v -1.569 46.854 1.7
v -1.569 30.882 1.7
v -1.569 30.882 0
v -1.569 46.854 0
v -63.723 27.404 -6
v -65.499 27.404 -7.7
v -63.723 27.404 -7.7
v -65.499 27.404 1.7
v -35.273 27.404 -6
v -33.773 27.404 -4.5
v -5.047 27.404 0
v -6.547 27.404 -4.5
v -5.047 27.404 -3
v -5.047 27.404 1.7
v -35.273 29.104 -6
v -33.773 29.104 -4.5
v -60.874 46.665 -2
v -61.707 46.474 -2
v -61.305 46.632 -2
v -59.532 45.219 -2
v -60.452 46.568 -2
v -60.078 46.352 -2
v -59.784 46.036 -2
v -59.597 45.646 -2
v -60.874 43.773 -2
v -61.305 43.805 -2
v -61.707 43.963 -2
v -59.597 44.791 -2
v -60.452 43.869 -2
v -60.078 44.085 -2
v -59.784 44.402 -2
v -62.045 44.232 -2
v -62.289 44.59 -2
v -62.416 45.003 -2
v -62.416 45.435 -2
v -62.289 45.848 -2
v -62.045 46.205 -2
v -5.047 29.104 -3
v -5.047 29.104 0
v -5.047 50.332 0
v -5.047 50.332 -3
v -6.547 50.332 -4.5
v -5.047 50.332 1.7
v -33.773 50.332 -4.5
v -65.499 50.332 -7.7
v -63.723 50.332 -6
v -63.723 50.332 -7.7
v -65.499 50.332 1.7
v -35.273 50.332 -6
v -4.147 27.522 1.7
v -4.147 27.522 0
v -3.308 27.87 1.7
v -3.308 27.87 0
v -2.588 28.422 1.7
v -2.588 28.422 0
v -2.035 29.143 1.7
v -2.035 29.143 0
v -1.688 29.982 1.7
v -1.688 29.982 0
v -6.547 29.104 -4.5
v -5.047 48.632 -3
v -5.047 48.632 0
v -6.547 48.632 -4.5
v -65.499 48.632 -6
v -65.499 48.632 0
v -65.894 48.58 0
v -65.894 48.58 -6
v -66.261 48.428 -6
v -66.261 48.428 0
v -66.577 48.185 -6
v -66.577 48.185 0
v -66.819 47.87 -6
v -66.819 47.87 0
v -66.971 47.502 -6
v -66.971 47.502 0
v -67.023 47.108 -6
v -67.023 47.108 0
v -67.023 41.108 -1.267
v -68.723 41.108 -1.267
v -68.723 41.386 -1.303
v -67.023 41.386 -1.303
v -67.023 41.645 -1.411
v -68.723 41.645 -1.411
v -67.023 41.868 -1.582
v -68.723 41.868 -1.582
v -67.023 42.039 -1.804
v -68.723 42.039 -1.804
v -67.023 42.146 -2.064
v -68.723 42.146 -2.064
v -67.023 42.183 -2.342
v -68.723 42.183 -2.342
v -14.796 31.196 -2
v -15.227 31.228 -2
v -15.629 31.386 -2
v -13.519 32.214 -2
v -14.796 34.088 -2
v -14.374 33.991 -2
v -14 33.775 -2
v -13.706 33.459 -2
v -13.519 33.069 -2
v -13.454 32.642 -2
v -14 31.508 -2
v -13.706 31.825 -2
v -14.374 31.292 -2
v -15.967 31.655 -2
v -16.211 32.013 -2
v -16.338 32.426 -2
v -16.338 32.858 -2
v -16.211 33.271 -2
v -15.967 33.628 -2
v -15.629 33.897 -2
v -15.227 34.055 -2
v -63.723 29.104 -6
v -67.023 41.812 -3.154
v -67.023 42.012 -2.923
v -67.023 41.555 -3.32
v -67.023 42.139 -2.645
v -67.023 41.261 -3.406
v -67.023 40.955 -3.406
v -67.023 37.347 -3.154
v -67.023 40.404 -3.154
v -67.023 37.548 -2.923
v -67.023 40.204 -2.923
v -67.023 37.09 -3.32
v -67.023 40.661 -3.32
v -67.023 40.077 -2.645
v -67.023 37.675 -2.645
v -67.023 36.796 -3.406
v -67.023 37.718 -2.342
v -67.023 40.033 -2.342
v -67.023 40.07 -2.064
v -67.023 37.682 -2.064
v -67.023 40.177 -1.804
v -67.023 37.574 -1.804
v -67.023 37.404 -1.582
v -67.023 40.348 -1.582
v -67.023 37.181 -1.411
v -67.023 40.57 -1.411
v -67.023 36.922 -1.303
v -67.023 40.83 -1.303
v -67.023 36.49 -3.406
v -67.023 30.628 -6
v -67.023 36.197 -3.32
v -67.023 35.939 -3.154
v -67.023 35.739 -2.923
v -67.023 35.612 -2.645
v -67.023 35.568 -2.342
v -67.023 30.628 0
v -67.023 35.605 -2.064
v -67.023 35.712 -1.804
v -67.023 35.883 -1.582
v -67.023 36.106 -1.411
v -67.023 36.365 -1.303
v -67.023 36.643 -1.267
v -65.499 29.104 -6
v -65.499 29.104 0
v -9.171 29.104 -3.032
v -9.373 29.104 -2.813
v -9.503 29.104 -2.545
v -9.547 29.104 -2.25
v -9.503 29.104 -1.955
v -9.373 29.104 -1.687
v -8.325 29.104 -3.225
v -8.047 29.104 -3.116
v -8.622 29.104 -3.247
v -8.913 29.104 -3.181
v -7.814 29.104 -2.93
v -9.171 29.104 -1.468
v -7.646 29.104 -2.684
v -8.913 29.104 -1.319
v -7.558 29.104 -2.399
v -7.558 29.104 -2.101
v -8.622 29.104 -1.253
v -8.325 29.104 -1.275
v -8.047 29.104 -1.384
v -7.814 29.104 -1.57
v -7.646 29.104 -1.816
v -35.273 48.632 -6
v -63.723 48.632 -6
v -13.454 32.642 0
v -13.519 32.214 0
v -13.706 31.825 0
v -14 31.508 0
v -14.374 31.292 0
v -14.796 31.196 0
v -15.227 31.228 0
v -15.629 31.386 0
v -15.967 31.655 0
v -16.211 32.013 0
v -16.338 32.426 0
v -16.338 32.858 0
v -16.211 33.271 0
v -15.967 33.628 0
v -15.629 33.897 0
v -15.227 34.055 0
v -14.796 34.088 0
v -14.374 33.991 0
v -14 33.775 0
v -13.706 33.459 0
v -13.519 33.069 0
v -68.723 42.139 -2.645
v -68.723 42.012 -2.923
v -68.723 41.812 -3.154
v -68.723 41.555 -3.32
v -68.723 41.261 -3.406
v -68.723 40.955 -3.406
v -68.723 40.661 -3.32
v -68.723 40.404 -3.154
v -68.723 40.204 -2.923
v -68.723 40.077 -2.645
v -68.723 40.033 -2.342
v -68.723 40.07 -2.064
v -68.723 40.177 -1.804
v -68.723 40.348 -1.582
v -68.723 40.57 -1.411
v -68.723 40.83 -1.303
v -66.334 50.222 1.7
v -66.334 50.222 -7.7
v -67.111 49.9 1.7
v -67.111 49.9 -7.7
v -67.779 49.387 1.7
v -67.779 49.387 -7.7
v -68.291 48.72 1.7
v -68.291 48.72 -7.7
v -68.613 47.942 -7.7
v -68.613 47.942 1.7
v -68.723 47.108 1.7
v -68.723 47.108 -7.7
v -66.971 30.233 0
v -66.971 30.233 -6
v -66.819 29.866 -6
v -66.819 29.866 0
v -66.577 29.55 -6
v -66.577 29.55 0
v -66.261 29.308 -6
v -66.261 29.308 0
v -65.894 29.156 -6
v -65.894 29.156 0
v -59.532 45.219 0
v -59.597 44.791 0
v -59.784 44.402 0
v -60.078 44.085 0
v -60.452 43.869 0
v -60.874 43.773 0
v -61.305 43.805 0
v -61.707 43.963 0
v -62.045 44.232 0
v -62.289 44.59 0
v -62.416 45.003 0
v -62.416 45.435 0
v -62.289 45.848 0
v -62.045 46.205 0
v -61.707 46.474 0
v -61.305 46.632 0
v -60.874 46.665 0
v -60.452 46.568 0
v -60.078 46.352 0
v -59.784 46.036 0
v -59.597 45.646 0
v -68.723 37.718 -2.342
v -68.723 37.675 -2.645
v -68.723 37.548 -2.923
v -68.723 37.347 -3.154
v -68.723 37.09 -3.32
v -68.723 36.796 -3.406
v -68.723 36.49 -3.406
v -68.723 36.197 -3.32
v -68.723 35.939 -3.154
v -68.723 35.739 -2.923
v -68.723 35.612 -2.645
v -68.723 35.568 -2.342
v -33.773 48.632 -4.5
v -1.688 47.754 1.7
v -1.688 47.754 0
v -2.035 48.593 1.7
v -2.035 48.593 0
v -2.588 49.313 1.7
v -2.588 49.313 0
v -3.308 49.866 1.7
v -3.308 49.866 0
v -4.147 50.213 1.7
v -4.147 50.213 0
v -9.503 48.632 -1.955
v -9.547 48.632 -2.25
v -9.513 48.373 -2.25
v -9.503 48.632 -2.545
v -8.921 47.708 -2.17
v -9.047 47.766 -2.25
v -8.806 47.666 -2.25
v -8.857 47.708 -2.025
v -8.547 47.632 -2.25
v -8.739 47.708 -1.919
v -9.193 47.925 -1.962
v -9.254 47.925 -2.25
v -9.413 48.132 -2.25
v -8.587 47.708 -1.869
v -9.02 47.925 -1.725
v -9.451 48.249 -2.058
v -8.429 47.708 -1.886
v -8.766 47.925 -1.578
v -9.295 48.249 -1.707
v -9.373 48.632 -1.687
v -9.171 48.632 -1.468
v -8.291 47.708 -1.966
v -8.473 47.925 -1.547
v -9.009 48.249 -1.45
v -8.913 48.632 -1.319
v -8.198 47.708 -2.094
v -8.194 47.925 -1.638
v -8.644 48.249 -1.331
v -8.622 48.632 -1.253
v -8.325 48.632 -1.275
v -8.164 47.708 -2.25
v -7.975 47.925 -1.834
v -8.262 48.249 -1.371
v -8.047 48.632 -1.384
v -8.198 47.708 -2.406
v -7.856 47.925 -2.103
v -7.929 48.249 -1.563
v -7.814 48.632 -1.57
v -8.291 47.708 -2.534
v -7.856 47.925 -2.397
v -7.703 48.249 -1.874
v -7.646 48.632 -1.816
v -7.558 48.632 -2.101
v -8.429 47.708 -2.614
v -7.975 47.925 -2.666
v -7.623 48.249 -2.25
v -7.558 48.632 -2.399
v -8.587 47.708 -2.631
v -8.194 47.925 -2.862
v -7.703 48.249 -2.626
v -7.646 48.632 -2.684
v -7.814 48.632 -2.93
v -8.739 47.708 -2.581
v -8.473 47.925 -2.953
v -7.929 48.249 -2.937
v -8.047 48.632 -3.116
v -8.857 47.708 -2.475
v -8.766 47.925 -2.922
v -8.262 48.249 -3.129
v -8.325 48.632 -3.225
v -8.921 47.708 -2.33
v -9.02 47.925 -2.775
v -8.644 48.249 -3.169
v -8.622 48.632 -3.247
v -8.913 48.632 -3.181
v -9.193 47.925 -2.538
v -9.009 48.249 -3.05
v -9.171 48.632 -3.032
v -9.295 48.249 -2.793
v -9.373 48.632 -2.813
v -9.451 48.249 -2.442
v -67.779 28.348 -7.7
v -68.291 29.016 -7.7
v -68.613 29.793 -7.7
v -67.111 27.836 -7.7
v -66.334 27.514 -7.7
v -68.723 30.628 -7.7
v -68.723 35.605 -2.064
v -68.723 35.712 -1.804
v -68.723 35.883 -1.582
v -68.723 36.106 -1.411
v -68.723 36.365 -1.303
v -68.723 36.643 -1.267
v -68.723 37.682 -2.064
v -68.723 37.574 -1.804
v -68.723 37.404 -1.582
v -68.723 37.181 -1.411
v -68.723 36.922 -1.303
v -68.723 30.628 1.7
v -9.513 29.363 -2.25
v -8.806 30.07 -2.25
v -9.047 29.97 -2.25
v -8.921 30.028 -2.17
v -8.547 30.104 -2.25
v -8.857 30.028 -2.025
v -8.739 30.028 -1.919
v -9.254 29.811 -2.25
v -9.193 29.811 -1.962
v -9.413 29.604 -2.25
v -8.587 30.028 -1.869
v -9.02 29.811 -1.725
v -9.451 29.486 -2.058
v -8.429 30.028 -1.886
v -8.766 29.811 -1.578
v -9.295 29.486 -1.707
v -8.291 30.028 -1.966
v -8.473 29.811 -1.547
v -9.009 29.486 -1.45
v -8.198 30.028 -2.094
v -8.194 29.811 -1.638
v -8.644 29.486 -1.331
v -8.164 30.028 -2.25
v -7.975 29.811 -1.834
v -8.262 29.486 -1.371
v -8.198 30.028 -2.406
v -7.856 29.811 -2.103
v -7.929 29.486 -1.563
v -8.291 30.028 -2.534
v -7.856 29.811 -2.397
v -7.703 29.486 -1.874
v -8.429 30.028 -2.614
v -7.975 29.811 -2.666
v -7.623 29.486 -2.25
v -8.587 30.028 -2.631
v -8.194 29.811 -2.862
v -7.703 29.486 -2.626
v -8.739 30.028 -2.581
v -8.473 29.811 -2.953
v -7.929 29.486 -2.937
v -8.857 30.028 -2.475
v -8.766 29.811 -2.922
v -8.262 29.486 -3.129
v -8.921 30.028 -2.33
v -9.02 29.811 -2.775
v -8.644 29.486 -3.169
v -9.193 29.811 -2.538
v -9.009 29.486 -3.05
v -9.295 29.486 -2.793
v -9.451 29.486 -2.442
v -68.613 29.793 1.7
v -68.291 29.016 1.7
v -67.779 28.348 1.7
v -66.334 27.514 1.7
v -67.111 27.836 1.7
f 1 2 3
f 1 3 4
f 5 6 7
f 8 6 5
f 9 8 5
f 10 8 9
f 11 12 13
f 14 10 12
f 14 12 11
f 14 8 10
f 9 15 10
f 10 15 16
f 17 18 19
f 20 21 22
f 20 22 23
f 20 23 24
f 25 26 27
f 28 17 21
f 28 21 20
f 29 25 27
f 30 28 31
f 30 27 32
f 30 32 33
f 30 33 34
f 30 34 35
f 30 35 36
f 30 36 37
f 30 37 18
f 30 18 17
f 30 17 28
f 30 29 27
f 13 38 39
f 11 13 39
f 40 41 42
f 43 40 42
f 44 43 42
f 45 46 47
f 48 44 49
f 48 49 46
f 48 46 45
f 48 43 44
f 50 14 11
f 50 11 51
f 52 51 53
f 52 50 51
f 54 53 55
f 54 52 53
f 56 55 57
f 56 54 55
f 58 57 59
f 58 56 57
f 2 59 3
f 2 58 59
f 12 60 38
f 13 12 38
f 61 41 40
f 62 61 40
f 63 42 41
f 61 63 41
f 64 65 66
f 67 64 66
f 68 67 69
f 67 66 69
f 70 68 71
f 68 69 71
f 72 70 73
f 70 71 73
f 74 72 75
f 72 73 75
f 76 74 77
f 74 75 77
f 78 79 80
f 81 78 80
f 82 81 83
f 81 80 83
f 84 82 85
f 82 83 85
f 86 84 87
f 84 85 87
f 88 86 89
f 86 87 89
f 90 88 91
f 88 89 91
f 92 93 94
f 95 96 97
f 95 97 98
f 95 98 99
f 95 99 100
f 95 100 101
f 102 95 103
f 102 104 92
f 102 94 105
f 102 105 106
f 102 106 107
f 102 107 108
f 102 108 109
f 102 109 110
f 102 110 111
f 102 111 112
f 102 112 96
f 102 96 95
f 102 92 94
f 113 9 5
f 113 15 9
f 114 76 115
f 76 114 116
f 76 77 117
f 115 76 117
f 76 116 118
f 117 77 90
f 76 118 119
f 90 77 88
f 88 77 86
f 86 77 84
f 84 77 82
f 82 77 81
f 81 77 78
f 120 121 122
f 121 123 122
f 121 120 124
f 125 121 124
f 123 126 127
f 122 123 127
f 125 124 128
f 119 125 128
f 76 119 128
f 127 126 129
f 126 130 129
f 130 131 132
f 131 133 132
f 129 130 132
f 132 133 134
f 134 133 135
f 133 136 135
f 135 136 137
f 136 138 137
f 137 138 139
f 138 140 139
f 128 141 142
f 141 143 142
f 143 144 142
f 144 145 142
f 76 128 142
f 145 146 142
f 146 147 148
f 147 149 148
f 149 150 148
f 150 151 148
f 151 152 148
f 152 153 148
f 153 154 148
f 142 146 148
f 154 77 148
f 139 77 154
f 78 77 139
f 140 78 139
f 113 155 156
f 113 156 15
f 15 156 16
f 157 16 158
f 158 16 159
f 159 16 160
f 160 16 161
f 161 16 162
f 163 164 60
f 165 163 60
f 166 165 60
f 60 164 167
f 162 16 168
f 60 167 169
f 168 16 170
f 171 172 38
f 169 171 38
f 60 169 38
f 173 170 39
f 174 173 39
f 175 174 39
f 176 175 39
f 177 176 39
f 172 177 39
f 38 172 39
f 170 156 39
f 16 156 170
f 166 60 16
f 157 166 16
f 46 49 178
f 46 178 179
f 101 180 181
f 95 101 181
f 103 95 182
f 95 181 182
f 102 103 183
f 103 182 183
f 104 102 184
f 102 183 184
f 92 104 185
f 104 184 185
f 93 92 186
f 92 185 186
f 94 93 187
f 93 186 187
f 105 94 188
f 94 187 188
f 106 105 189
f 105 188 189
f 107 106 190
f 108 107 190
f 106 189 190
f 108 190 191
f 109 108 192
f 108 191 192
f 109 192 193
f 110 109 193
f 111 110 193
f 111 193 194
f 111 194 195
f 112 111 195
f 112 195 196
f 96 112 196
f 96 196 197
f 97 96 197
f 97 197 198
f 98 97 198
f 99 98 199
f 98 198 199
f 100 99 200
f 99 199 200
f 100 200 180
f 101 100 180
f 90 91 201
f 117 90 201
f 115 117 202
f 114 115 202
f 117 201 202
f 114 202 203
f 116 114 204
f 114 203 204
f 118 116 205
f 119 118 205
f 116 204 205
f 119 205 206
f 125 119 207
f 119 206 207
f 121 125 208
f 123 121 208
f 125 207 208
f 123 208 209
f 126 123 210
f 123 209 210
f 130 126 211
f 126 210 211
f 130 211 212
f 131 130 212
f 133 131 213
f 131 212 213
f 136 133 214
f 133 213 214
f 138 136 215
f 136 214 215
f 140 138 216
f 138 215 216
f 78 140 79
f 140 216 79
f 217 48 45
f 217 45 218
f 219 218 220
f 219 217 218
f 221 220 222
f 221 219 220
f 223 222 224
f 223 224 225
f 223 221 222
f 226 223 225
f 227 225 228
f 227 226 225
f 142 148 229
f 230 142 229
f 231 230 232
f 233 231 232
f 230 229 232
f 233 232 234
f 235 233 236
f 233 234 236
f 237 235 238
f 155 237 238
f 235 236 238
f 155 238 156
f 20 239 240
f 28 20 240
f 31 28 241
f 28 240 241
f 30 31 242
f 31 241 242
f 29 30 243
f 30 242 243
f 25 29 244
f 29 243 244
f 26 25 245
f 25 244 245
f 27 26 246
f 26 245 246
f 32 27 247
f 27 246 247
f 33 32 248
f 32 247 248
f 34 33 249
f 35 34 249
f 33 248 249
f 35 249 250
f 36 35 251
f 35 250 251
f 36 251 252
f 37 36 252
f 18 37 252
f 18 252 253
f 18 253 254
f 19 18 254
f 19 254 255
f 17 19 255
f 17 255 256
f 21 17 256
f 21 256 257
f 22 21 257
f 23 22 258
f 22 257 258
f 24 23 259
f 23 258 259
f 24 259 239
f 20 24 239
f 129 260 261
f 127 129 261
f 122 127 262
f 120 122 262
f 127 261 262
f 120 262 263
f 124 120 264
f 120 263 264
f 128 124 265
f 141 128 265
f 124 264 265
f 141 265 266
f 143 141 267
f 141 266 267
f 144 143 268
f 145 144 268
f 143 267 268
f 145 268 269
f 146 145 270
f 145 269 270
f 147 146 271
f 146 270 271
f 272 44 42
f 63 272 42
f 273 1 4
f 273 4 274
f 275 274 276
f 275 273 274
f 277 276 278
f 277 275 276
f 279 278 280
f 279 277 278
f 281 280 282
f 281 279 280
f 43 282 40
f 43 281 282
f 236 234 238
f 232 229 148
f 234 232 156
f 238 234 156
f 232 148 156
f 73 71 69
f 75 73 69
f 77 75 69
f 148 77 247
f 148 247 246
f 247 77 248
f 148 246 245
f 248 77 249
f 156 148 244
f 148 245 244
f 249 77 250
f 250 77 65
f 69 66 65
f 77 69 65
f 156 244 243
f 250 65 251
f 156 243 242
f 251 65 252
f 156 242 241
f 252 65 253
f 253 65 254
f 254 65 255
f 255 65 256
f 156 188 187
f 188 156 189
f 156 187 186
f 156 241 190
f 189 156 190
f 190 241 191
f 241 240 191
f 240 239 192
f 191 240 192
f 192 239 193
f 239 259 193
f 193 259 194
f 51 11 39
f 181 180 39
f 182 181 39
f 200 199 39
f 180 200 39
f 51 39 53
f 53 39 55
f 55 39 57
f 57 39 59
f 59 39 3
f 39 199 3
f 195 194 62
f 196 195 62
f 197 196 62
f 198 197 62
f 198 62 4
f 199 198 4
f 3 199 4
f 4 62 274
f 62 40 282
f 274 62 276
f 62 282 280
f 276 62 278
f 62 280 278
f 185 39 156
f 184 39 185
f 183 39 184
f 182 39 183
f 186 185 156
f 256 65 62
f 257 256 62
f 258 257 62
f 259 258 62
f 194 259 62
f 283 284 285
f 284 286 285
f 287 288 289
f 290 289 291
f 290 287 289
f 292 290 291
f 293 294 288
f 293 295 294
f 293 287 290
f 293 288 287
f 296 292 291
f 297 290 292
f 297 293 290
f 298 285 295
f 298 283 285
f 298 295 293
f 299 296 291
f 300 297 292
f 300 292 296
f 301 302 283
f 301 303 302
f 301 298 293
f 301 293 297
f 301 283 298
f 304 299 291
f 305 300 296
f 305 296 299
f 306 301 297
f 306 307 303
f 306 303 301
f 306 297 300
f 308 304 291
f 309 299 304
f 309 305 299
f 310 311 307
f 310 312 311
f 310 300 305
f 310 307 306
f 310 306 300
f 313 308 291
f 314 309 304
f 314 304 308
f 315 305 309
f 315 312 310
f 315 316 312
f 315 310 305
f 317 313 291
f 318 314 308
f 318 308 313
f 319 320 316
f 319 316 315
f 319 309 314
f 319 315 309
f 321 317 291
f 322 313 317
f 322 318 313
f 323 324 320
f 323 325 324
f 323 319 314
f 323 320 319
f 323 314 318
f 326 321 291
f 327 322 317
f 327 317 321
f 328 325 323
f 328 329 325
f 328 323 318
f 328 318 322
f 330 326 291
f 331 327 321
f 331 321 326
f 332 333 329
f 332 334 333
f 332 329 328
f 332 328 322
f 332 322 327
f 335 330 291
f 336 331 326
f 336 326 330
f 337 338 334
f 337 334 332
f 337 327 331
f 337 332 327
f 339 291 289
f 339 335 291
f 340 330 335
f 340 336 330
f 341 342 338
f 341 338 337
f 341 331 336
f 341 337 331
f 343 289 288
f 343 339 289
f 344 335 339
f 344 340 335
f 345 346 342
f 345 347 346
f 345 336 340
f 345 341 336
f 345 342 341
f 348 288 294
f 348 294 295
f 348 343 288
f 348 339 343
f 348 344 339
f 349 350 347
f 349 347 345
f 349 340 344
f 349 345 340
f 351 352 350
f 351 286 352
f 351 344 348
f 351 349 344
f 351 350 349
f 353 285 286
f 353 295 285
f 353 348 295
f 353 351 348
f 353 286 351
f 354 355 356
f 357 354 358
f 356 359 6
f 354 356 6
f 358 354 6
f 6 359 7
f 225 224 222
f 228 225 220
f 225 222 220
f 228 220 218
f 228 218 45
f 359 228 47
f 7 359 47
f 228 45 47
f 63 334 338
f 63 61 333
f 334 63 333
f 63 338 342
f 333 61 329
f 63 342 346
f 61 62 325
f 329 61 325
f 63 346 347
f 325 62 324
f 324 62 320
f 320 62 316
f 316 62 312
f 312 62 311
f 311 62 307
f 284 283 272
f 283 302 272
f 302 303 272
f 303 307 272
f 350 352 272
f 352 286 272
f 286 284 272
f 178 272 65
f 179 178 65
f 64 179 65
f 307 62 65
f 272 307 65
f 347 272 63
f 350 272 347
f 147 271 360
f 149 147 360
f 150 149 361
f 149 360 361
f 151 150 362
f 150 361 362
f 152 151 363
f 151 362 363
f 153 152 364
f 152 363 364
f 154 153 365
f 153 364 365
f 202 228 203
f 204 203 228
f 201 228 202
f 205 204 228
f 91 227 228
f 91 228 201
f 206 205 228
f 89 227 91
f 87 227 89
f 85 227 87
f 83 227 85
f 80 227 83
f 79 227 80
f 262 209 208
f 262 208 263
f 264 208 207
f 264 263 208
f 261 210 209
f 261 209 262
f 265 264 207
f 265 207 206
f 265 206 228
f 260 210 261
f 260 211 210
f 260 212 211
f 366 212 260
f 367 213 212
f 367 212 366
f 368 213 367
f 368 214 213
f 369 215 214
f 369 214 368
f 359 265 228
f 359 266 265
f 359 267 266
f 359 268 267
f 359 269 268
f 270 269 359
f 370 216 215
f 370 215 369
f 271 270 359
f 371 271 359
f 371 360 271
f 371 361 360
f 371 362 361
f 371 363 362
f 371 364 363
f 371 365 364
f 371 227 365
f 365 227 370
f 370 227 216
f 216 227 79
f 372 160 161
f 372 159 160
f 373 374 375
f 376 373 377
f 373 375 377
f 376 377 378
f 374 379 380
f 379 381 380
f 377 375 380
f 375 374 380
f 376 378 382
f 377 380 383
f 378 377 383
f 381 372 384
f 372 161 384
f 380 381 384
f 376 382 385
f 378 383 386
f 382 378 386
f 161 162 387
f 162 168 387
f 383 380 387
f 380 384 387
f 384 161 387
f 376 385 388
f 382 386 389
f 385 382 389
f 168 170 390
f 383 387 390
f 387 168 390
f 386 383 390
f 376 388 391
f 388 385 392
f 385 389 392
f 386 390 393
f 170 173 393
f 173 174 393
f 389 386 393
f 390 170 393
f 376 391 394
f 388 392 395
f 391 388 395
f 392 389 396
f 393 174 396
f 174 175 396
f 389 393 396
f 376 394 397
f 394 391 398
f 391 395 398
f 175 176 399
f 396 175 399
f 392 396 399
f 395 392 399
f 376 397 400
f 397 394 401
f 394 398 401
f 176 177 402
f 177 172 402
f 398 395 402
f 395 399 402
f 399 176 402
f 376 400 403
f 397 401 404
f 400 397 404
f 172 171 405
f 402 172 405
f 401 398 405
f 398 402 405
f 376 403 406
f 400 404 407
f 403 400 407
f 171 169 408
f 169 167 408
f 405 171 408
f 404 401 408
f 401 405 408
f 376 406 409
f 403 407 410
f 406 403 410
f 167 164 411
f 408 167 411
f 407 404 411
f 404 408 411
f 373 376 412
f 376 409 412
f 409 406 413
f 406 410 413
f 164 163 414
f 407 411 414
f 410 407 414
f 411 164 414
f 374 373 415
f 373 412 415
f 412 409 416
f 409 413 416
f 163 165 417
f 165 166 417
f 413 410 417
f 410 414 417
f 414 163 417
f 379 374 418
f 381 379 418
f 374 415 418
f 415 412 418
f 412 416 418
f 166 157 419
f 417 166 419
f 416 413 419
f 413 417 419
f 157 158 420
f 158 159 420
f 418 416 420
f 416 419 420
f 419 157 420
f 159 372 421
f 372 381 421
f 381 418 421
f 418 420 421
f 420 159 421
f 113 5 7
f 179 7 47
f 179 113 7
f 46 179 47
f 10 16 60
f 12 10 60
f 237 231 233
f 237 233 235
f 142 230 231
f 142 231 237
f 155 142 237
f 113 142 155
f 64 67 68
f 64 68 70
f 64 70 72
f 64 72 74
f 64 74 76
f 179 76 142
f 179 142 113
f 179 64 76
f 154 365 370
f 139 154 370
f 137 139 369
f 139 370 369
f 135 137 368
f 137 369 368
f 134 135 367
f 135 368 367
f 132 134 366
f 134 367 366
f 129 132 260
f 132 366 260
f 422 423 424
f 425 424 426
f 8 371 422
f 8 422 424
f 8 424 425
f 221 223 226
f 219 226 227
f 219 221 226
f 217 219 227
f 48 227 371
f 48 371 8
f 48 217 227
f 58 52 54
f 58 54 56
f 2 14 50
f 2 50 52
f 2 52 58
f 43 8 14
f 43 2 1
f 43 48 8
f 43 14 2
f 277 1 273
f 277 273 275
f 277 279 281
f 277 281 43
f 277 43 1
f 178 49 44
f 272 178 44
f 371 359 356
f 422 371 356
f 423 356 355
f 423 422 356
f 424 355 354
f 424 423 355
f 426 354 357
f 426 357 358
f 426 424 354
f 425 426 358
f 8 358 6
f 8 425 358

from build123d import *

# Parameters (mm, degrees)
BOSS_EXTRUDE1_DEPTH = 6
BOSS_EXTRUDE2_START = 1.7
BOSS_EXTRUDE2_DEPTH = 1.7
CUT_EXTRUDE3_DEPTH  = 29
BOSS_EXTRUDE5_DEPTH = 1.7
CUT_EXTRUDE4_DEPTH  = 85.274737764
SKETCH17_R          = 1.45
BOSS_EXTRUDE6_DEPTH = 2


with BuildPart() as part:
    # Sketch1 → Boss-Extrude1 (new body)
    with BuildSketch(Plane.XY):
        with BuildLine():
            Line((-65.499084074, 50.331718091), (-14.793168506, 50.331718091))
            Line((-14.793168506, 50.331718091), (-5.047168405, 50.331718091))
            ThreePointArc((-5.047168405, 50.331718091), (-2.58785102, 49.313035476), (-1.569168405, 46.853718091))
            Line((-1.569168405, 46.853718091), (-1.569168405, 43.965718386))
            Line((-1.569168405, 43.965718386), (-1.569168405, 33.805718061))
            Line((-1.569168405, 33.805718061), (-1.569168405, 30.881718108))
            ThreePointArc((-1.569168405, 30.881718108), (-2.58785102, 28.422400723), (-5.047168405, 27.403718108))
            Line((-5.047168405, 27.403718108), (-14.829168757, 27.403718108))
            Line((-14.829168757, 27.403718108), (-65.499083667, 27.403718108))
            ThreePointArc((-65.499083667, 27.403718108), (-67.778855129, 28.348030366), (-68.723167387, 30.627801828))
            Line((-68.723167387, 30.627801828), (-68.723167387, 47.107634778))
            ThreePointArc((-68.723167387, 47.107634778), (-67.778855248, 49.387405952), (-65.499084074, 50.331718091))
        make_face()
        with BuildLine():
            Line((-3.269168405, 43.965718386), (-3.269168405, 46.853718091))
            ThreePointArc((-3.269168405, 46.853718091), (-3.789932548, 48.110953948), (-5.047168405, 48.631718091))
            Line((-5.047168405, 48.631718091), (-14.793168506, 48.631718091))
            Line((-14.793168506, 48.631718091), (-65.499084074, 48.631718091))
            ThreePointArc((-65.499084074, 48.631718091), (-66.57677372, 48.185324424), (-67.023167387, 47.107634778))
            Line((-67.023167387, 47.107634778), (-67.023167387, 30.627801828))
            ThreePointArc((-67.023167387, 30.627801828), (-66.576773601, 29.550111894), (-65.499083667, 29.103718108))
            Line((-65.499083667, 29.103718108), (-14.829168757, 29.103718108))
            Line((-14.829168757, 29.103718108), (-5.047168405, 29.103718108))
            ThreePointArc((-5.047168405, 29.103718108), (-3.789932548, 29.624482251), (-3.269168405, 30.881718108))
            Line((-3.269168405, 30.881718108), (-3.269168405, 33.805718061))
            Line((-3.269168405, 33.805718061), (-3.269168405, 43.965718386))
        make_face(mode=Mode.SUBTRACT)
    extrude(amount=-BOSS_EXTRUDE1_DEPTH)

    # Sketch3 → Boss-Extrude2 (add)
    with BuildSketch(Plane.XY.offset(BOSS_EXTRUDE2_START)):
        with BuildLine():
            Line((-68.723167387, 47.107634778), (-68.723167387, 30.627801828))
            ThreePointArc((-68.723167387, 30.627801828), (-67.778855129, 28.348030366), (-65.499083667, 27.403718108))
            Line((-65.499083667, 27.403718108), (-5.047168405, 27.403718108))
            ThreePointArc((-5.047168405, 27.403718108), (-2.58785102, 28.422400723), (-1.569168405, 30.881718108))
            Line((-1.569168405, 30.881718108), (-1.569168405, 46.853718091))
            ThreePointArc((-1.569168405, 46.853718091), (-2.58785102, 49.313035476), (-5.047168405, 50.331718091))
            Line((-5.047168405, 50.331718091), (-65.499084074, 50.331718091))
            ThreePointArc((-65.499084074, 50.331718091), (-67.778855248, 49.387405952), (-68.723167387, 47.107634778))
        make_face()
    extrude(amount=-BOSS_EXTRUDE2_DEPTH)

    # Sketch11 → Cut-Extrude3 (cut)
    with BuildSketch(Plane(origin=(0, 50.331718091, 0), x_dir=(1, 0, 0), z_dir=(0, 1, 0))):
        Polygon((-35.27312624, 6), (-33.77312624, 4.5), (-6.547168405, 4.5), (-5.047168405, 3), (-5.047168405, 0), (-1.569168405, 0), (-1.569168405, 6), align=None)
    extrude(amount=-CUT_EXTRUDE3_DEPTH, mode=Mode.SUBTRACT)

    # Sketch13 → Revolve3 (revolve)
    with BuildSketch(Plane(origin=(0, 0, -2.25), x_dir=(-1, 0, 0), z_dir=(0, 0, -1))):
        with BuildLine():
            Line((8.547168405, 29.103718108), (8.547168405, 30.103718108))
            ThreePointArc((8.547168405, 30.103718108), (9.254275186, 29.810824889), (9.547168405, 29.103718108))
            Line((9.547168405, 29.103718108), (8.547168405, 29.103718108))
        make_face()
    revolve3 = revolve(axis=Axis((-8.547168405, 29.103718108, -2.25), (0, 1, 0)))

    # Mirror3: Revolve3 across plane
    add(revolve3.mirror(Plane(origin=(0, 38.867718099, 0), x_dir=(0, 0, 1), z_dir=(0, -1, 0))))

    # Sketch14 → Boss-Extrude5 (add)
    with BuildSketch(Plane(origin=(0, 0, -6), x_dir=(-1, 0, 0), z_dir=(0, 0, -1))):
        with BuildLine():
            Line((63.723167387, 27.403718108), (63.723167387, 50.331718091))
            Line((63.723167387, 50.331718091), (65.499084074, 50.331718091))
            ThreePointArc((65.499084074, 50.331718091), (67.778855248, 49.387405952), (68.723167387, 47.107634778))
            Line((68.723167387, 47.107634778), (68.723167387, 30.627801828))
            ThreePointArc((68.723167387, 30.627801828), (67.778855129, 28.348030366), (65.499083667, 27.403718108))
            Line((65.499083667, 27.403718108), (63.723167387, 27.403718108))
        make_face()
    extrude(amount=BOSS_EXTRUDE5_DEPTH)

    # Sketch15 → Cut-Extrude4 (cut, through all)
    with BuildSketch(Plane.ZY.offset(68.723167387)):
        with BuildLine():
            ThreePointArc((-2.341753072, 42.182977625), (-3.416753072, 41.107977625), (-2.341753072, 40.032977625))
            Line((-2.341753072, 40.032977625), (-2.341753072, 42.182977625))
        make_face()
        with BuildLine():
            Line((-2.341753072, 42.182977625), (-2.341753072, 40.032977625))
            ThreePointArc((-2.341753072, 40.032977625), (-1.581613282, 40.347837835), (-1.266753072, 41.107977625))
            ThreePointArc((-1.266753072, 41.107977625), (-1.581613282, 41.868117415), (-2.341753072, 42.182977625))
        make_face()
        with BuildLine():
            ThreePointArc((-2.341753072, 37.718380266), (-3.416753072, 36.643380266), (-2.341753072, 35.568380266))
            Line((-2.341753072, 35.568380266), (-2.341753072, 37.718380266))
        make_face()
        with BuildLine():
            Line((-2.341753072, 37.718380266), (-2.341753072, 35.568380266))
            ThreePointArc((-2.341753072, 35.568380266), (-1.581613282, 35.883240476), (-1.266753072, 36.643380266))
            ThreePointArc((-1.266753072, 36.643380266), (-1.581613282, 37.403520056), (-2.341753072, 37.718380266))
        make_face()
    extrude(amount=-CUT_EXTRUDE4_DEPTH, mode=Mode.SUBTRACT)

    # Sketch17 → Boss-Extrude6 (add)
    with BuildSketch(Plane(origin=(0, 0, 0), x_dir=(-1, 0, 0), z_dir=(0, 0, -1))):
        with Locations(Location((14.904168421, 32.641718081, 0), (0, 0, 180))):
            Circle(SKETCH17_R)
        with Locations(Location((60.982168421, 45.218718081, 0), (0, 0, 180))):
            Circle(SKETCH17_R)
    extrude(amount=BOSS_EXTRUDE6_DEPTH)


solid = part.part
